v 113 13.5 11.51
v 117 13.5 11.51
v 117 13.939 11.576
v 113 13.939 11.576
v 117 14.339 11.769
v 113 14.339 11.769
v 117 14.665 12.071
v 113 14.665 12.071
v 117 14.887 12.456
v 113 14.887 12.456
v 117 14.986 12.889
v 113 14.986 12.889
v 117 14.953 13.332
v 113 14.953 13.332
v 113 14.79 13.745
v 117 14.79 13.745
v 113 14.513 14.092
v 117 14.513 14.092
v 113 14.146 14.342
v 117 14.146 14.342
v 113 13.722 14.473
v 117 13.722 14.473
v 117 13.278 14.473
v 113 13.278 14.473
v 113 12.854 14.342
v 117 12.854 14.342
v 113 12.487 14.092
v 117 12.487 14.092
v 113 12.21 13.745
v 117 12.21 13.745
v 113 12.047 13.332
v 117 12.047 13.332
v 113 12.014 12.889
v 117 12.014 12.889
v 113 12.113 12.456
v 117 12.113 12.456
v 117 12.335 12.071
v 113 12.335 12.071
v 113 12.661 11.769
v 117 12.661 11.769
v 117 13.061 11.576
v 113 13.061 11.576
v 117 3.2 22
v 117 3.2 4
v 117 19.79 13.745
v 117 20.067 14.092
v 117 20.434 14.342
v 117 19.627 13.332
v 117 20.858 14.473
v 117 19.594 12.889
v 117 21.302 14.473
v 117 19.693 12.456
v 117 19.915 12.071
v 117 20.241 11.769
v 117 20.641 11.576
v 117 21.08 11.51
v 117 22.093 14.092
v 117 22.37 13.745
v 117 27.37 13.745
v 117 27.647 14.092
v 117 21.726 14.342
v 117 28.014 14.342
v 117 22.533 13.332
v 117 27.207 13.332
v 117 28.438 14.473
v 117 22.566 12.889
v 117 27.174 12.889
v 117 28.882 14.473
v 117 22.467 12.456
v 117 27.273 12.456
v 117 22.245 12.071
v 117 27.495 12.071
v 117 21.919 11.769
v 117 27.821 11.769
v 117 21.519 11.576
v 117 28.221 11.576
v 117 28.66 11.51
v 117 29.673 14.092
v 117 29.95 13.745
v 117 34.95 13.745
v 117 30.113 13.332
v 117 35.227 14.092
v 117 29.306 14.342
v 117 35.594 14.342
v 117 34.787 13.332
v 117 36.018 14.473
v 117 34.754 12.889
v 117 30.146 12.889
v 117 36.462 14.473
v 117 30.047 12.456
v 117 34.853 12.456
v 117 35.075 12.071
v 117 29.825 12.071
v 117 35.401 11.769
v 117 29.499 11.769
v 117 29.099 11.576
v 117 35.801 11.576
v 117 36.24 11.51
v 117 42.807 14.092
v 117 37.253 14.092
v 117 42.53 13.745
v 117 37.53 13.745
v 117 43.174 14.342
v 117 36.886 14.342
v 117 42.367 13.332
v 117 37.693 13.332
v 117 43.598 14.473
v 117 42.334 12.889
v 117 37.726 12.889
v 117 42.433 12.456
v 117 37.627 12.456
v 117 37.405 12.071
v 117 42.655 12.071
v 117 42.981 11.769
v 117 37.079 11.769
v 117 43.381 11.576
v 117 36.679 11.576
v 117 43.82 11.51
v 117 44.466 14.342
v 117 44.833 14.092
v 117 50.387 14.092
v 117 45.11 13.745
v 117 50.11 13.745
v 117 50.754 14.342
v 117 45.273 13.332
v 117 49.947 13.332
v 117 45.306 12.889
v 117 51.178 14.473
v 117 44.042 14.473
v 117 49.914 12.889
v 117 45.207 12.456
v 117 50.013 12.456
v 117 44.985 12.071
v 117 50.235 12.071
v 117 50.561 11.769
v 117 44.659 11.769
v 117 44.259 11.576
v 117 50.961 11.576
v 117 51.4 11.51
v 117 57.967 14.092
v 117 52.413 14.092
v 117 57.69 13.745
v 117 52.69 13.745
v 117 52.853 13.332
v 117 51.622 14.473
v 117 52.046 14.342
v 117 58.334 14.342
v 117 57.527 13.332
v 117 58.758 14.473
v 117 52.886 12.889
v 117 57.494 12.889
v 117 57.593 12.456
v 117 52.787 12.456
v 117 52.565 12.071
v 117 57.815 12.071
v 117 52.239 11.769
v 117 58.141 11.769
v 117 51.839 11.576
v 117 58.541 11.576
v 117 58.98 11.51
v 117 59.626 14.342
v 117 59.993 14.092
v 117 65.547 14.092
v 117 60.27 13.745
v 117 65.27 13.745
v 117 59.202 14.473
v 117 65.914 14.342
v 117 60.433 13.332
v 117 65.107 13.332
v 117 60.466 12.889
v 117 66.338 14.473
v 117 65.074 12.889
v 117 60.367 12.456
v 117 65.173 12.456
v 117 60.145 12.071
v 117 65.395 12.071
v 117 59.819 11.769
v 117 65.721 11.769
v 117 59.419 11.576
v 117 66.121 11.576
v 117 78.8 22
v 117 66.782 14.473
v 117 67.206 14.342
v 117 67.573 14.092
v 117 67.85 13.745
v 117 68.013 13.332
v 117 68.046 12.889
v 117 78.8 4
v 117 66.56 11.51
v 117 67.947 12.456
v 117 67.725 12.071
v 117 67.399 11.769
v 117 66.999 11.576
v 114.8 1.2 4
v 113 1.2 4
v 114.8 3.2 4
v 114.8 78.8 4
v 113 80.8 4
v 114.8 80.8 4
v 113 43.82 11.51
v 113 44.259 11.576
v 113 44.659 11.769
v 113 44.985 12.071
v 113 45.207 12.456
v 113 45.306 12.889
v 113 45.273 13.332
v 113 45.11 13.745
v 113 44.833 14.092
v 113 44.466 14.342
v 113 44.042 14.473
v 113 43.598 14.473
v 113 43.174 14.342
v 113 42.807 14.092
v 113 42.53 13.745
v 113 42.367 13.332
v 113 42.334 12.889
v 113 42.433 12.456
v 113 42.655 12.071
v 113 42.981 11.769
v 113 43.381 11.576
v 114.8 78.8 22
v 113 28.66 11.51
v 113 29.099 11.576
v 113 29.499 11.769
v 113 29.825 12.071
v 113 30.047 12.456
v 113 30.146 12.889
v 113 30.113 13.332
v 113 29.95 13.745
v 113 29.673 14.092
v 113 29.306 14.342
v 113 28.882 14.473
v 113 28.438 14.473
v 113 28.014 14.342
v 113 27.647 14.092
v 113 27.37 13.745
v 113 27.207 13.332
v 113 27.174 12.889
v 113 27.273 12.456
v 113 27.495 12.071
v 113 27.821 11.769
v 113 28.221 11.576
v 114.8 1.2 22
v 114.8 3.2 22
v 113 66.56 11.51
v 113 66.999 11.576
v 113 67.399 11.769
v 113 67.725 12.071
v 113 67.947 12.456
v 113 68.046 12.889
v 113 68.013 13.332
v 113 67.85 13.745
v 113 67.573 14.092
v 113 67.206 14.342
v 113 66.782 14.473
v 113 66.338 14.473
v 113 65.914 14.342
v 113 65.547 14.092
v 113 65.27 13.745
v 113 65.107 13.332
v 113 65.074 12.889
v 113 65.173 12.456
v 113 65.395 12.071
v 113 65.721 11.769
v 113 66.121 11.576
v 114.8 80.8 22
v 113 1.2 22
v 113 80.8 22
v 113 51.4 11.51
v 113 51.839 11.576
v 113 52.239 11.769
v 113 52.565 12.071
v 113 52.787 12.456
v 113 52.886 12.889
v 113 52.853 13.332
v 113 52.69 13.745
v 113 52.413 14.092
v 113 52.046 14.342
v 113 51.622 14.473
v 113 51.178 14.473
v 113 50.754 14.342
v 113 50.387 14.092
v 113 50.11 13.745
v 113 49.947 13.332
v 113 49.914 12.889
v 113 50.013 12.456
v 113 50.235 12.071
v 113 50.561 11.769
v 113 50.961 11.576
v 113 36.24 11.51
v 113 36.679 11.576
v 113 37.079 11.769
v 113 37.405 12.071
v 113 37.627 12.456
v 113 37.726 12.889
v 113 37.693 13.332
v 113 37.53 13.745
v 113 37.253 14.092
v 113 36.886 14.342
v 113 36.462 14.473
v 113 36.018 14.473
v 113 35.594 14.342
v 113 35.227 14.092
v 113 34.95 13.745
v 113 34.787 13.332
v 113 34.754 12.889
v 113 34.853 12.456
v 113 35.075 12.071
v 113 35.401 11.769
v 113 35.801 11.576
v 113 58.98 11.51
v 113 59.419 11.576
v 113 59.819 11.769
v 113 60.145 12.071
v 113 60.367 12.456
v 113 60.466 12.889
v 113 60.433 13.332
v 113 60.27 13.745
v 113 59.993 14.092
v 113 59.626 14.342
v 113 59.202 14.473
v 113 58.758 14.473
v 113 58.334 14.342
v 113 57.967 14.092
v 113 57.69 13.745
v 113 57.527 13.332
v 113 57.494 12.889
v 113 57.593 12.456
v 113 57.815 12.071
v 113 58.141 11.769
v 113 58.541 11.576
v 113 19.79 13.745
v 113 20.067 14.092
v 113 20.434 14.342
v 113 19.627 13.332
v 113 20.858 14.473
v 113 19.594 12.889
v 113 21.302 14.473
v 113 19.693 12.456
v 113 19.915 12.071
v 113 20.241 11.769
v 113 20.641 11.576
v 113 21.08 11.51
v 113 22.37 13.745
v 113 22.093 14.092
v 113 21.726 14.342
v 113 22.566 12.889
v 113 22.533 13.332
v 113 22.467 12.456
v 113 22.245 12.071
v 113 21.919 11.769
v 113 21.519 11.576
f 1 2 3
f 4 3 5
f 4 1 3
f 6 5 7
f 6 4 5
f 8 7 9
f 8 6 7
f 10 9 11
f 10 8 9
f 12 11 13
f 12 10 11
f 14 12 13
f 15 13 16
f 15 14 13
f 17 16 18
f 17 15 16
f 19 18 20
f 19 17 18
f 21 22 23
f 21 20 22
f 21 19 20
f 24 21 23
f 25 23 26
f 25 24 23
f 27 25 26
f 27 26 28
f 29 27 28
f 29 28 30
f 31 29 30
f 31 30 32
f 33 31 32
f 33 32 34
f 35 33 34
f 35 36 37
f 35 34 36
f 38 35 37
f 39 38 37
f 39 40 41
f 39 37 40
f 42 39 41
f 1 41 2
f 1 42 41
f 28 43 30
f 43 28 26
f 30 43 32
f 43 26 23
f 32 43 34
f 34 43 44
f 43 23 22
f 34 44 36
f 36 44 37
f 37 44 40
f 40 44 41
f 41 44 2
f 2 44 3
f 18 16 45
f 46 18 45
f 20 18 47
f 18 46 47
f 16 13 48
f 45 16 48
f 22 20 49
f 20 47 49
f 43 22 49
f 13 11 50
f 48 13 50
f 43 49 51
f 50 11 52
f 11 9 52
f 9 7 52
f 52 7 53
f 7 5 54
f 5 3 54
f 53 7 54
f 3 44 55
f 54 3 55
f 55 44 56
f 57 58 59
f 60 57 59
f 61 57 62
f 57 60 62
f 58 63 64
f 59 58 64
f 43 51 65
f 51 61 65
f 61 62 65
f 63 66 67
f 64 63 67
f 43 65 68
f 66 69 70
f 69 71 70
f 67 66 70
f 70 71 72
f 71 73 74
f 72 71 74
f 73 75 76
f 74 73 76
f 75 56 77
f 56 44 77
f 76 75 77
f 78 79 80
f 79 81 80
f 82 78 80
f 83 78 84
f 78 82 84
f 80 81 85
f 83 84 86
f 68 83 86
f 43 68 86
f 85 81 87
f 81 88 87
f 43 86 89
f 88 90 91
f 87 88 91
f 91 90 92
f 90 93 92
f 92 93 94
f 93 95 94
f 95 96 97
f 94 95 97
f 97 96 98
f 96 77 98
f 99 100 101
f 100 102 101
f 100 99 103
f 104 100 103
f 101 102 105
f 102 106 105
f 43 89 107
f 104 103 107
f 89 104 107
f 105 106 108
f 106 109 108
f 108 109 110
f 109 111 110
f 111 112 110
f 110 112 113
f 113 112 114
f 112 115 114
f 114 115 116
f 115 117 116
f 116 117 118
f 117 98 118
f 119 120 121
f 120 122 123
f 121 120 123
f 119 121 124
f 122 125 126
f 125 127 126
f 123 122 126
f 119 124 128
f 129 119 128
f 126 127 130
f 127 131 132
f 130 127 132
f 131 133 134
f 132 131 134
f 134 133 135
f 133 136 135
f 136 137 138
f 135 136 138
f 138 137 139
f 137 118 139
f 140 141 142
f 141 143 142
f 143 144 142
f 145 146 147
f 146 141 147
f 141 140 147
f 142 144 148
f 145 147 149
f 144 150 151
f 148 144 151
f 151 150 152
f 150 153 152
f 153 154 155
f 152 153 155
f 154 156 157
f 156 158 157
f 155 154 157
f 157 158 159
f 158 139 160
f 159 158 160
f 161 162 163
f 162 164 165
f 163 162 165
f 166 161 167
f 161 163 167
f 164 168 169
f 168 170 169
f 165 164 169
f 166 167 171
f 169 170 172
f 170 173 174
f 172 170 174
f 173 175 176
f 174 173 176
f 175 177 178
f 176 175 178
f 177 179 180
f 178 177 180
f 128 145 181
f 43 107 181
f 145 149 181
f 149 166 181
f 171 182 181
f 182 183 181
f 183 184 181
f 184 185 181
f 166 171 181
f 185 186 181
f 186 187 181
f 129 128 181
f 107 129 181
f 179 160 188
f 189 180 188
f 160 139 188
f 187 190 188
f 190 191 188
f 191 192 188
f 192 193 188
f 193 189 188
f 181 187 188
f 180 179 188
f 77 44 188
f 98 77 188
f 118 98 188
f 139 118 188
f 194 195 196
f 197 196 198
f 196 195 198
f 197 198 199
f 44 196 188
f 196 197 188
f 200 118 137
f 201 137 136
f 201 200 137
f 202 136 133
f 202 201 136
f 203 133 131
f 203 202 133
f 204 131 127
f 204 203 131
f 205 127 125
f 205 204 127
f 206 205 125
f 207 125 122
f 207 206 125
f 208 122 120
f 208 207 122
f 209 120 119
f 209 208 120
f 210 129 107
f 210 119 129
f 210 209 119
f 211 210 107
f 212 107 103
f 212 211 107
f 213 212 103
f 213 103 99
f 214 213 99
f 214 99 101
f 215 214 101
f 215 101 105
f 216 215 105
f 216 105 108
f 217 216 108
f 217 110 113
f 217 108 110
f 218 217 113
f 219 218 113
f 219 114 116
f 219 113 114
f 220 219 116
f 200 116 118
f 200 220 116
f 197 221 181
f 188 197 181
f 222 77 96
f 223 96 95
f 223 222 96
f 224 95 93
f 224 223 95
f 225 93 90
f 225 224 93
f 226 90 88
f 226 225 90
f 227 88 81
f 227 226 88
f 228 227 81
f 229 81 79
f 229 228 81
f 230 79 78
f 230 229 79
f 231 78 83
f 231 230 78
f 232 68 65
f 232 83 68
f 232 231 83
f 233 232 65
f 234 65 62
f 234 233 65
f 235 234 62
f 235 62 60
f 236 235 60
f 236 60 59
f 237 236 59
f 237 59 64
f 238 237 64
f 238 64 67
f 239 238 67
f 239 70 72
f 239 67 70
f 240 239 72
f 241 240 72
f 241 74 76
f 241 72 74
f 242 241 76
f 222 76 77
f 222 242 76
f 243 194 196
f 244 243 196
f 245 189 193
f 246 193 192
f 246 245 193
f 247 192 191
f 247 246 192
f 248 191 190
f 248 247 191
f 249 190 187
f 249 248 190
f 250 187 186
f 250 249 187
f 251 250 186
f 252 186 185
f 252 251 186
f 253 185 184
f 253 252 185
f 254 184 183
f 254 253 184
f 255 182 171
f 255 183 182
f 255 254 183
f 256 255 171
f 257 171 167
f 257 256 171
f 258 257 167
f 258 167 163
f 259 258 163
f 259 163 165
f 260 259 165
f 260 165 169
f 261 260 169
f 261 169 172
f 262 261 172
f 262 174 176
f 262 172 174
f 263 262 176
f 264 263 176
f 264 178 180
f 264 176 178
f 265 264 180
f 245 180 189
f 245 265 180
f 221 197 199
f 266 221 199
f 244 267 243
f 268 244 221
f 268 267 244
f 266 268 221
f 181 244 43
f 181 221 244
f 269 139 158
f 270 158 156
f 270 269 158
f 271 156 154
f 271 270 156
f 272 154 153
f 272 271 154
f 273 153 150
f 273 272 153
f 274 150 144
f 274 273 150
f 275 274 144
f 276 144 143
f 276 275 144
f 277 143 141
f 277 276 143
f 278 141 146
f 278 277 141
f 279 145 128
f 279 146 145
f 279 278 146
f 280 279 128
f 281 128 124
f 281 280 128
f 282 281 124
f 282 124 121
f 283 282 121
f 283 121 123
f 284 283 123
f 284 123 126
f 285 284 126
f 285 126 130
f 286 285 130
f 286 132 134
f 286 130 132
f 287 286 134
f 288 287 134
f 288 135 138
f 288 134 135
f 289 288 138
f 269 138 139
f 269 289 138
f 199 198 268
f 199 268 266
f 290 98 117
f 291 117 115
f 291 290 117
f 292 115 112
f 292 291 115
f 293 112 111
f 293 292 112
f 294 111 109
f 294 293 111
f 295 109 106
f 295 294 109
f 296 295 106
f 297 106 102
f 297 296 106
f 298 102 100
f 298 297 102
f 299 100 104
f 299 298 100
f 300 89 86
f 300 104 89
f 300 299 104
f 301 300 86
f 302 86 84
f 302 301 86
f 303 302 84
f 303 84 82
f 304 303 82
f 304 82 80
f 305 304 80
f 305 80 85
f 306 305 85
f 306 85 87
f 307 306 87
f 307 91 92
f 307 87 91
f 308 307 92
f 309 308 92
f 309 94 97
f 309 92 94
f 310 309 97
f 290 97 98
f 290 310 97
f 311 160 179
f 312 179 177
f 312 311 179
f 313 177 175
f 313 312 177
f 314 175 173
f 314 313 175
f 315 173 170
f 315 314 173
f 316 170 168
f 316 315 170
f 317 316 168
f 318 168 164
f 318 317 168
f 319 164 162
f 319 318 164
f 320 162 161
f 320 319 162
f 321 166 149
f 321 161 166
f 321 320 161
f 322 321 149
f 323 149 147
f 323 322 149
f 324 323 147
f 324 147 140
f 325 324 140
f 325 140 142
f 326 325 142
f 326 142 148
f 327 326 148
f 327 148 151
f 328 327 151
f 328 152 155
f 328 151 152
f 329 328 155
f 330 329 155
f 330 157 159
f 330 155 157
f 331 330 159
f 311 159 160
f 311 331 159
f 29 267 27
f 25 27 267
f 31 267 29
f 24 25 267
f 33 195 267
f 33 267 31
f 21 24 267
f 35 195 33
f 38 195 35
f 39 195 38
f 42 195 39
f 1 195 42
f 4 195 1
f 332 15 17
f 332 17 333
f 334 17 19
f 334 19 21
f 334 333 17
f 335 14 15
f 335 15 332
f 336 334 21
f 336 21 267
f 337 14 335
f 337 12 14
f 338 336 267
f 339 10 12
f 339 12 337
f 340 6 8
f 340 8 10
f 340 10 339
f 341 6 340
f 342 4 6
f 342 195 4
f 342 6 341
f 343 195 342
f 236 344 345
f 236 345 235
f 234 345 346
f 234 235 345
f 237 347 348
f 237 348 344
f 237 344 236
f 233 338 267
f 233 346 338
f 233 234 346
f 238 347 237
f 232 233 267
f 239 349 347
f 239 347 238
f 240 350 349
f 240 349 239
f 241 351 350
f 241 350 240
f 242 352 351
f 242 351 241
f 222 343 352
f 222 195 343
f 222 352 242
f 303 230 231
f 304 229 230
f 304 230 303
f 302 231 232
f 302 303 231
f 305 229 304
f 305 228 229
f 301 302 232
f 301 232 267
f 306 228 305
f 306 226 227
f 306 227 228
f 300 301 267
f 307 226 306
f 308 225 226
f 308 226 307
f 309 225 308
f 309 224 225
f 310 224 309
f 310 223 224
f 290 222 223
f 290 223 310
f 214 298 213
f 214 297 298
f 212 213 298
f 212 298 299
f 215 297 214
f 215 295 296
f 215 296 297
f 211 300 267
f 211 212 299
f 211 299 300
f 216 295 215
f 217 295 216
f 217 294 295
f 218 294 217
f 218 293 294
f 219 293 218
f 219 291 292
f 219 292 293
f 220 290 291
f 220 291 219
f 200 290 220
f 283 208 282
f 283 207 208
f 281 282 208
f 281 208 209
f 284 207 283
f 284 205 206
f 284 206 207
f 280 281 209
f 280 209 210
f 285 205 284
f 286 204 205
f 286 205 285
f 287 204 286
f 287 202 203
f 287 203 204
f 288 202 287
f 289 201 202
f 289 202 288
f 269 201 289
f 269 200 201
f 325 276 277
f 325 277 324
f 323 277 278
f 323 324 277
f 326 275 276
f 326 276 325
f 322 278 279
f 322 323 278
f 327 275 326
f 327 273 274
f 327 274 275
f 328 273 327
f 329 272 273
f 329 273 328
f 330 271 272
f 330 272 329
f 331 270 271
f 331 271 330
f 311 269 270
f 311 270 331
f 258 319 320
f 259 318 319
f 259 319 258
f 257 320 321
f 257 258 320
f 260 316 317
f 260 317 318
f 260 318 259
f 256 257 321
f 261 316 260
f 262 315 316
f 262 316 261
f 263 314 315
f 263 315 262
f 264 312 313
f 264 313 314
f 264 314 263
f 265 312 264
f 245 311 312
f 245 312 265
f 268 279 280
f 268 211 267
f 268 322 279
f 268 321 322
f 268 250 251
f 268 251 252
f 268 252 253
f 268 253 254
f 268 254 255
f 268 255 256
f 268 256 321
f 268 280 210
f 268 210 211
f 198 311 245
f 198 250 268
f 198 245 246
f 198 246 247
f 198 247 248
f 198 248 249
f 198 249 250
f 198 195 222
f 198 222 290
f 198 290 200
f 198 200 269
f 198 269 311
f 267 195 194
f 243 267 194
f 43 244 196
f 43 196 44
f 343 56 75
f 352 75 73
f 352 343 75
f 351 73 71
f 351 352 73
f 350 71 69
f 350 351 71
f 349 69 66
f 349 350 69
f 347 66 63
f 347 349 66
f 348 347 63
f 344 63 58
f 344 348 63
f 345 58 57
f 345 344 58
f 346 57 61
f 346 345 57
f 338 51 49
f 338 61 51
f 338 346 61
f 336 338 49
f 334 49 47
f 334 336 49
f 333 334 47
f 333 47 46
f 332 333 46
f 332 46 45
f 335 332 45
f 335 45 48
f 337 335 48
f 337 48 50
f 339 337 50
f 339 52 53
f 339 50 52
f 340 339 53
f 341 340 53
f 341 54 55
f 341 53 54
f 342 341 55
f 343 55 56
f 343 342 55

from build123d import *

# Parameters (mm, degrees)
CYLINDER006_R     = 1.49
CYLINDER006_DEPTH = 10
ARRAY015_Y_COUNT  = 8
ARRAY015_Y_PITCH  = 7.58
BOX051_W          = 10
BOX051_H          = 10
BOX051_DEPTH      = 31
BOX050_W          = 10
BOX050_H          = 10
BOX050_DEPTH      = 30
BOX049_W          = 10
BOX049_H          = 10
BOX049_DEPTH      = 25
BOX048_W          = 10
BOX048_H          = 10
BOX048_DEPTH      = 25
BOX046_W          = 2
BOX046_H          = 80
BOX046_DEPTH      = 18
BOX047_W          = 4
BOX047_H          = 76
BOX047_DEPTH      = 18


with BuildPart() as array015:
    # Cylinder006 → Cylinder006 (new body)
    with BuildSketch(Plane(origin=(143, 6, 13), x_dir=(0, 0, -1), z_dir=(1, 0, 0))):
        Circle(CYLINDER006_R)
    extrude(amount=CYLINDER006_DEPTH)

    # Array015 Y: Array015 ×8


with BuildPart() as array015_1:
    add(array015.part)
    with Locations(*[(0, i * ARRAY015_Y_PITCH, 0) for i in range(1, ARRAY015_Y_COUNT)]):
        add(array015.part)


with BuildPart() as array015_2:
    # Array015 placement: moved
    add(array015_1.part.moved(Location((-30, 7.5, 0))))


with BuildPart() as w_rfel037:
    # Box051 → Box051 (new body)
    with BuildSketch(Plane(origin=(110, 80.8, 0), x_dir=(1, 0, 0), z_dir=(0, 0, 1))):
        with Locations((5, 5)):
            Rectangle(BOX051_W, BOX051_H)
    extrude(amount=BOX051_DEPTH)


with BuildPart() as w_rfel036:
    # Box050 → Box050 (new body)
    with BuildSketch(Plane(origin=(109, -8.8, 0), x_dir=(1, 0, 0), z_dir=(0, 0, 1))):
        with Locations((5, 5)):
            Rectangle(BOX050_W, BOX050_H)
    extrude(amount=BOX050_DEPTH)


with BuildPart() as w_rfel035:
    # Box049 → Box049 (new body)
    with BuildSketch(Plane(origin=(114.8, 78.8, 0), x_dir=(1, 0, 0), z_dir=(0, 0, 1))):
        with Locations((5, 5)):
            Rectangle(BOX049_W, BOX049_H)
    extrude(amount=BOX049_DEPTH)


with BuildPart() as w_rfel034:
    # Box048 → Box048 (new body)
    with BuildSketch(Plane(origin=(114.8, -6.8, 0), x_dir=(1, 0, 0), z_dir=(0, 0, 1))):
        with Locations((5, 5)):
            Rectangle(BOX048_W, BOX048_H)
    extrude(amount=BOX048_DEPTH)


with BuildPart() as f_hrung003:
    # Box046 → Box046 (new body)
    with BuildSketch(Plane(origin=(113, 1, 23), x_dir=(1, 0, 0), z_dir=(0, 0, 1))):
        with Locations((1, 40)):
            Rectangle(BOX046_W, BOX046_H)
    extrude(amount=BOX046_DEPTH)


with BuildPart() as cut051:
    # Box047 → Box047 (new body)
    with BuildSketch(Plane(origin=(113, 3, 23), x_dir=(1, 0, 0), z_dir=(0, 0, 1))):
        with Locations((2, 38)):
            Rectangle(BOX047_W, BOX047_H)
    extrude(amount=BOX047_DEPTH)

    # Fusion008031: union Führung003
    add(f_hrung003.part)


with BuildPart() as cut051_1:
    # Fusion008031 placement: moved
    add(cut051.part.moved(Location((0, 0, -19))))

    # Cut047: cut Würfel034
    add(w_rfel034.part, mode=Mode.SUBTRACT)

    # Cut048: cut Würfel035
    add(w_rfel035.part, mode=Mode.SUBTRACT)

    # Cut049: cut Würfel036
    add(w_rfel036.part, mode=Mode.SUBTRACT)

    # Cut050: cut Würfel037
    add(w_rfel037.part, mode=Mode.SUBTRACT)

    # Cut051: cut Array015
    add(array015_2.part, mode=Mode.SUBTRACT)


solid = cut051_1.part
